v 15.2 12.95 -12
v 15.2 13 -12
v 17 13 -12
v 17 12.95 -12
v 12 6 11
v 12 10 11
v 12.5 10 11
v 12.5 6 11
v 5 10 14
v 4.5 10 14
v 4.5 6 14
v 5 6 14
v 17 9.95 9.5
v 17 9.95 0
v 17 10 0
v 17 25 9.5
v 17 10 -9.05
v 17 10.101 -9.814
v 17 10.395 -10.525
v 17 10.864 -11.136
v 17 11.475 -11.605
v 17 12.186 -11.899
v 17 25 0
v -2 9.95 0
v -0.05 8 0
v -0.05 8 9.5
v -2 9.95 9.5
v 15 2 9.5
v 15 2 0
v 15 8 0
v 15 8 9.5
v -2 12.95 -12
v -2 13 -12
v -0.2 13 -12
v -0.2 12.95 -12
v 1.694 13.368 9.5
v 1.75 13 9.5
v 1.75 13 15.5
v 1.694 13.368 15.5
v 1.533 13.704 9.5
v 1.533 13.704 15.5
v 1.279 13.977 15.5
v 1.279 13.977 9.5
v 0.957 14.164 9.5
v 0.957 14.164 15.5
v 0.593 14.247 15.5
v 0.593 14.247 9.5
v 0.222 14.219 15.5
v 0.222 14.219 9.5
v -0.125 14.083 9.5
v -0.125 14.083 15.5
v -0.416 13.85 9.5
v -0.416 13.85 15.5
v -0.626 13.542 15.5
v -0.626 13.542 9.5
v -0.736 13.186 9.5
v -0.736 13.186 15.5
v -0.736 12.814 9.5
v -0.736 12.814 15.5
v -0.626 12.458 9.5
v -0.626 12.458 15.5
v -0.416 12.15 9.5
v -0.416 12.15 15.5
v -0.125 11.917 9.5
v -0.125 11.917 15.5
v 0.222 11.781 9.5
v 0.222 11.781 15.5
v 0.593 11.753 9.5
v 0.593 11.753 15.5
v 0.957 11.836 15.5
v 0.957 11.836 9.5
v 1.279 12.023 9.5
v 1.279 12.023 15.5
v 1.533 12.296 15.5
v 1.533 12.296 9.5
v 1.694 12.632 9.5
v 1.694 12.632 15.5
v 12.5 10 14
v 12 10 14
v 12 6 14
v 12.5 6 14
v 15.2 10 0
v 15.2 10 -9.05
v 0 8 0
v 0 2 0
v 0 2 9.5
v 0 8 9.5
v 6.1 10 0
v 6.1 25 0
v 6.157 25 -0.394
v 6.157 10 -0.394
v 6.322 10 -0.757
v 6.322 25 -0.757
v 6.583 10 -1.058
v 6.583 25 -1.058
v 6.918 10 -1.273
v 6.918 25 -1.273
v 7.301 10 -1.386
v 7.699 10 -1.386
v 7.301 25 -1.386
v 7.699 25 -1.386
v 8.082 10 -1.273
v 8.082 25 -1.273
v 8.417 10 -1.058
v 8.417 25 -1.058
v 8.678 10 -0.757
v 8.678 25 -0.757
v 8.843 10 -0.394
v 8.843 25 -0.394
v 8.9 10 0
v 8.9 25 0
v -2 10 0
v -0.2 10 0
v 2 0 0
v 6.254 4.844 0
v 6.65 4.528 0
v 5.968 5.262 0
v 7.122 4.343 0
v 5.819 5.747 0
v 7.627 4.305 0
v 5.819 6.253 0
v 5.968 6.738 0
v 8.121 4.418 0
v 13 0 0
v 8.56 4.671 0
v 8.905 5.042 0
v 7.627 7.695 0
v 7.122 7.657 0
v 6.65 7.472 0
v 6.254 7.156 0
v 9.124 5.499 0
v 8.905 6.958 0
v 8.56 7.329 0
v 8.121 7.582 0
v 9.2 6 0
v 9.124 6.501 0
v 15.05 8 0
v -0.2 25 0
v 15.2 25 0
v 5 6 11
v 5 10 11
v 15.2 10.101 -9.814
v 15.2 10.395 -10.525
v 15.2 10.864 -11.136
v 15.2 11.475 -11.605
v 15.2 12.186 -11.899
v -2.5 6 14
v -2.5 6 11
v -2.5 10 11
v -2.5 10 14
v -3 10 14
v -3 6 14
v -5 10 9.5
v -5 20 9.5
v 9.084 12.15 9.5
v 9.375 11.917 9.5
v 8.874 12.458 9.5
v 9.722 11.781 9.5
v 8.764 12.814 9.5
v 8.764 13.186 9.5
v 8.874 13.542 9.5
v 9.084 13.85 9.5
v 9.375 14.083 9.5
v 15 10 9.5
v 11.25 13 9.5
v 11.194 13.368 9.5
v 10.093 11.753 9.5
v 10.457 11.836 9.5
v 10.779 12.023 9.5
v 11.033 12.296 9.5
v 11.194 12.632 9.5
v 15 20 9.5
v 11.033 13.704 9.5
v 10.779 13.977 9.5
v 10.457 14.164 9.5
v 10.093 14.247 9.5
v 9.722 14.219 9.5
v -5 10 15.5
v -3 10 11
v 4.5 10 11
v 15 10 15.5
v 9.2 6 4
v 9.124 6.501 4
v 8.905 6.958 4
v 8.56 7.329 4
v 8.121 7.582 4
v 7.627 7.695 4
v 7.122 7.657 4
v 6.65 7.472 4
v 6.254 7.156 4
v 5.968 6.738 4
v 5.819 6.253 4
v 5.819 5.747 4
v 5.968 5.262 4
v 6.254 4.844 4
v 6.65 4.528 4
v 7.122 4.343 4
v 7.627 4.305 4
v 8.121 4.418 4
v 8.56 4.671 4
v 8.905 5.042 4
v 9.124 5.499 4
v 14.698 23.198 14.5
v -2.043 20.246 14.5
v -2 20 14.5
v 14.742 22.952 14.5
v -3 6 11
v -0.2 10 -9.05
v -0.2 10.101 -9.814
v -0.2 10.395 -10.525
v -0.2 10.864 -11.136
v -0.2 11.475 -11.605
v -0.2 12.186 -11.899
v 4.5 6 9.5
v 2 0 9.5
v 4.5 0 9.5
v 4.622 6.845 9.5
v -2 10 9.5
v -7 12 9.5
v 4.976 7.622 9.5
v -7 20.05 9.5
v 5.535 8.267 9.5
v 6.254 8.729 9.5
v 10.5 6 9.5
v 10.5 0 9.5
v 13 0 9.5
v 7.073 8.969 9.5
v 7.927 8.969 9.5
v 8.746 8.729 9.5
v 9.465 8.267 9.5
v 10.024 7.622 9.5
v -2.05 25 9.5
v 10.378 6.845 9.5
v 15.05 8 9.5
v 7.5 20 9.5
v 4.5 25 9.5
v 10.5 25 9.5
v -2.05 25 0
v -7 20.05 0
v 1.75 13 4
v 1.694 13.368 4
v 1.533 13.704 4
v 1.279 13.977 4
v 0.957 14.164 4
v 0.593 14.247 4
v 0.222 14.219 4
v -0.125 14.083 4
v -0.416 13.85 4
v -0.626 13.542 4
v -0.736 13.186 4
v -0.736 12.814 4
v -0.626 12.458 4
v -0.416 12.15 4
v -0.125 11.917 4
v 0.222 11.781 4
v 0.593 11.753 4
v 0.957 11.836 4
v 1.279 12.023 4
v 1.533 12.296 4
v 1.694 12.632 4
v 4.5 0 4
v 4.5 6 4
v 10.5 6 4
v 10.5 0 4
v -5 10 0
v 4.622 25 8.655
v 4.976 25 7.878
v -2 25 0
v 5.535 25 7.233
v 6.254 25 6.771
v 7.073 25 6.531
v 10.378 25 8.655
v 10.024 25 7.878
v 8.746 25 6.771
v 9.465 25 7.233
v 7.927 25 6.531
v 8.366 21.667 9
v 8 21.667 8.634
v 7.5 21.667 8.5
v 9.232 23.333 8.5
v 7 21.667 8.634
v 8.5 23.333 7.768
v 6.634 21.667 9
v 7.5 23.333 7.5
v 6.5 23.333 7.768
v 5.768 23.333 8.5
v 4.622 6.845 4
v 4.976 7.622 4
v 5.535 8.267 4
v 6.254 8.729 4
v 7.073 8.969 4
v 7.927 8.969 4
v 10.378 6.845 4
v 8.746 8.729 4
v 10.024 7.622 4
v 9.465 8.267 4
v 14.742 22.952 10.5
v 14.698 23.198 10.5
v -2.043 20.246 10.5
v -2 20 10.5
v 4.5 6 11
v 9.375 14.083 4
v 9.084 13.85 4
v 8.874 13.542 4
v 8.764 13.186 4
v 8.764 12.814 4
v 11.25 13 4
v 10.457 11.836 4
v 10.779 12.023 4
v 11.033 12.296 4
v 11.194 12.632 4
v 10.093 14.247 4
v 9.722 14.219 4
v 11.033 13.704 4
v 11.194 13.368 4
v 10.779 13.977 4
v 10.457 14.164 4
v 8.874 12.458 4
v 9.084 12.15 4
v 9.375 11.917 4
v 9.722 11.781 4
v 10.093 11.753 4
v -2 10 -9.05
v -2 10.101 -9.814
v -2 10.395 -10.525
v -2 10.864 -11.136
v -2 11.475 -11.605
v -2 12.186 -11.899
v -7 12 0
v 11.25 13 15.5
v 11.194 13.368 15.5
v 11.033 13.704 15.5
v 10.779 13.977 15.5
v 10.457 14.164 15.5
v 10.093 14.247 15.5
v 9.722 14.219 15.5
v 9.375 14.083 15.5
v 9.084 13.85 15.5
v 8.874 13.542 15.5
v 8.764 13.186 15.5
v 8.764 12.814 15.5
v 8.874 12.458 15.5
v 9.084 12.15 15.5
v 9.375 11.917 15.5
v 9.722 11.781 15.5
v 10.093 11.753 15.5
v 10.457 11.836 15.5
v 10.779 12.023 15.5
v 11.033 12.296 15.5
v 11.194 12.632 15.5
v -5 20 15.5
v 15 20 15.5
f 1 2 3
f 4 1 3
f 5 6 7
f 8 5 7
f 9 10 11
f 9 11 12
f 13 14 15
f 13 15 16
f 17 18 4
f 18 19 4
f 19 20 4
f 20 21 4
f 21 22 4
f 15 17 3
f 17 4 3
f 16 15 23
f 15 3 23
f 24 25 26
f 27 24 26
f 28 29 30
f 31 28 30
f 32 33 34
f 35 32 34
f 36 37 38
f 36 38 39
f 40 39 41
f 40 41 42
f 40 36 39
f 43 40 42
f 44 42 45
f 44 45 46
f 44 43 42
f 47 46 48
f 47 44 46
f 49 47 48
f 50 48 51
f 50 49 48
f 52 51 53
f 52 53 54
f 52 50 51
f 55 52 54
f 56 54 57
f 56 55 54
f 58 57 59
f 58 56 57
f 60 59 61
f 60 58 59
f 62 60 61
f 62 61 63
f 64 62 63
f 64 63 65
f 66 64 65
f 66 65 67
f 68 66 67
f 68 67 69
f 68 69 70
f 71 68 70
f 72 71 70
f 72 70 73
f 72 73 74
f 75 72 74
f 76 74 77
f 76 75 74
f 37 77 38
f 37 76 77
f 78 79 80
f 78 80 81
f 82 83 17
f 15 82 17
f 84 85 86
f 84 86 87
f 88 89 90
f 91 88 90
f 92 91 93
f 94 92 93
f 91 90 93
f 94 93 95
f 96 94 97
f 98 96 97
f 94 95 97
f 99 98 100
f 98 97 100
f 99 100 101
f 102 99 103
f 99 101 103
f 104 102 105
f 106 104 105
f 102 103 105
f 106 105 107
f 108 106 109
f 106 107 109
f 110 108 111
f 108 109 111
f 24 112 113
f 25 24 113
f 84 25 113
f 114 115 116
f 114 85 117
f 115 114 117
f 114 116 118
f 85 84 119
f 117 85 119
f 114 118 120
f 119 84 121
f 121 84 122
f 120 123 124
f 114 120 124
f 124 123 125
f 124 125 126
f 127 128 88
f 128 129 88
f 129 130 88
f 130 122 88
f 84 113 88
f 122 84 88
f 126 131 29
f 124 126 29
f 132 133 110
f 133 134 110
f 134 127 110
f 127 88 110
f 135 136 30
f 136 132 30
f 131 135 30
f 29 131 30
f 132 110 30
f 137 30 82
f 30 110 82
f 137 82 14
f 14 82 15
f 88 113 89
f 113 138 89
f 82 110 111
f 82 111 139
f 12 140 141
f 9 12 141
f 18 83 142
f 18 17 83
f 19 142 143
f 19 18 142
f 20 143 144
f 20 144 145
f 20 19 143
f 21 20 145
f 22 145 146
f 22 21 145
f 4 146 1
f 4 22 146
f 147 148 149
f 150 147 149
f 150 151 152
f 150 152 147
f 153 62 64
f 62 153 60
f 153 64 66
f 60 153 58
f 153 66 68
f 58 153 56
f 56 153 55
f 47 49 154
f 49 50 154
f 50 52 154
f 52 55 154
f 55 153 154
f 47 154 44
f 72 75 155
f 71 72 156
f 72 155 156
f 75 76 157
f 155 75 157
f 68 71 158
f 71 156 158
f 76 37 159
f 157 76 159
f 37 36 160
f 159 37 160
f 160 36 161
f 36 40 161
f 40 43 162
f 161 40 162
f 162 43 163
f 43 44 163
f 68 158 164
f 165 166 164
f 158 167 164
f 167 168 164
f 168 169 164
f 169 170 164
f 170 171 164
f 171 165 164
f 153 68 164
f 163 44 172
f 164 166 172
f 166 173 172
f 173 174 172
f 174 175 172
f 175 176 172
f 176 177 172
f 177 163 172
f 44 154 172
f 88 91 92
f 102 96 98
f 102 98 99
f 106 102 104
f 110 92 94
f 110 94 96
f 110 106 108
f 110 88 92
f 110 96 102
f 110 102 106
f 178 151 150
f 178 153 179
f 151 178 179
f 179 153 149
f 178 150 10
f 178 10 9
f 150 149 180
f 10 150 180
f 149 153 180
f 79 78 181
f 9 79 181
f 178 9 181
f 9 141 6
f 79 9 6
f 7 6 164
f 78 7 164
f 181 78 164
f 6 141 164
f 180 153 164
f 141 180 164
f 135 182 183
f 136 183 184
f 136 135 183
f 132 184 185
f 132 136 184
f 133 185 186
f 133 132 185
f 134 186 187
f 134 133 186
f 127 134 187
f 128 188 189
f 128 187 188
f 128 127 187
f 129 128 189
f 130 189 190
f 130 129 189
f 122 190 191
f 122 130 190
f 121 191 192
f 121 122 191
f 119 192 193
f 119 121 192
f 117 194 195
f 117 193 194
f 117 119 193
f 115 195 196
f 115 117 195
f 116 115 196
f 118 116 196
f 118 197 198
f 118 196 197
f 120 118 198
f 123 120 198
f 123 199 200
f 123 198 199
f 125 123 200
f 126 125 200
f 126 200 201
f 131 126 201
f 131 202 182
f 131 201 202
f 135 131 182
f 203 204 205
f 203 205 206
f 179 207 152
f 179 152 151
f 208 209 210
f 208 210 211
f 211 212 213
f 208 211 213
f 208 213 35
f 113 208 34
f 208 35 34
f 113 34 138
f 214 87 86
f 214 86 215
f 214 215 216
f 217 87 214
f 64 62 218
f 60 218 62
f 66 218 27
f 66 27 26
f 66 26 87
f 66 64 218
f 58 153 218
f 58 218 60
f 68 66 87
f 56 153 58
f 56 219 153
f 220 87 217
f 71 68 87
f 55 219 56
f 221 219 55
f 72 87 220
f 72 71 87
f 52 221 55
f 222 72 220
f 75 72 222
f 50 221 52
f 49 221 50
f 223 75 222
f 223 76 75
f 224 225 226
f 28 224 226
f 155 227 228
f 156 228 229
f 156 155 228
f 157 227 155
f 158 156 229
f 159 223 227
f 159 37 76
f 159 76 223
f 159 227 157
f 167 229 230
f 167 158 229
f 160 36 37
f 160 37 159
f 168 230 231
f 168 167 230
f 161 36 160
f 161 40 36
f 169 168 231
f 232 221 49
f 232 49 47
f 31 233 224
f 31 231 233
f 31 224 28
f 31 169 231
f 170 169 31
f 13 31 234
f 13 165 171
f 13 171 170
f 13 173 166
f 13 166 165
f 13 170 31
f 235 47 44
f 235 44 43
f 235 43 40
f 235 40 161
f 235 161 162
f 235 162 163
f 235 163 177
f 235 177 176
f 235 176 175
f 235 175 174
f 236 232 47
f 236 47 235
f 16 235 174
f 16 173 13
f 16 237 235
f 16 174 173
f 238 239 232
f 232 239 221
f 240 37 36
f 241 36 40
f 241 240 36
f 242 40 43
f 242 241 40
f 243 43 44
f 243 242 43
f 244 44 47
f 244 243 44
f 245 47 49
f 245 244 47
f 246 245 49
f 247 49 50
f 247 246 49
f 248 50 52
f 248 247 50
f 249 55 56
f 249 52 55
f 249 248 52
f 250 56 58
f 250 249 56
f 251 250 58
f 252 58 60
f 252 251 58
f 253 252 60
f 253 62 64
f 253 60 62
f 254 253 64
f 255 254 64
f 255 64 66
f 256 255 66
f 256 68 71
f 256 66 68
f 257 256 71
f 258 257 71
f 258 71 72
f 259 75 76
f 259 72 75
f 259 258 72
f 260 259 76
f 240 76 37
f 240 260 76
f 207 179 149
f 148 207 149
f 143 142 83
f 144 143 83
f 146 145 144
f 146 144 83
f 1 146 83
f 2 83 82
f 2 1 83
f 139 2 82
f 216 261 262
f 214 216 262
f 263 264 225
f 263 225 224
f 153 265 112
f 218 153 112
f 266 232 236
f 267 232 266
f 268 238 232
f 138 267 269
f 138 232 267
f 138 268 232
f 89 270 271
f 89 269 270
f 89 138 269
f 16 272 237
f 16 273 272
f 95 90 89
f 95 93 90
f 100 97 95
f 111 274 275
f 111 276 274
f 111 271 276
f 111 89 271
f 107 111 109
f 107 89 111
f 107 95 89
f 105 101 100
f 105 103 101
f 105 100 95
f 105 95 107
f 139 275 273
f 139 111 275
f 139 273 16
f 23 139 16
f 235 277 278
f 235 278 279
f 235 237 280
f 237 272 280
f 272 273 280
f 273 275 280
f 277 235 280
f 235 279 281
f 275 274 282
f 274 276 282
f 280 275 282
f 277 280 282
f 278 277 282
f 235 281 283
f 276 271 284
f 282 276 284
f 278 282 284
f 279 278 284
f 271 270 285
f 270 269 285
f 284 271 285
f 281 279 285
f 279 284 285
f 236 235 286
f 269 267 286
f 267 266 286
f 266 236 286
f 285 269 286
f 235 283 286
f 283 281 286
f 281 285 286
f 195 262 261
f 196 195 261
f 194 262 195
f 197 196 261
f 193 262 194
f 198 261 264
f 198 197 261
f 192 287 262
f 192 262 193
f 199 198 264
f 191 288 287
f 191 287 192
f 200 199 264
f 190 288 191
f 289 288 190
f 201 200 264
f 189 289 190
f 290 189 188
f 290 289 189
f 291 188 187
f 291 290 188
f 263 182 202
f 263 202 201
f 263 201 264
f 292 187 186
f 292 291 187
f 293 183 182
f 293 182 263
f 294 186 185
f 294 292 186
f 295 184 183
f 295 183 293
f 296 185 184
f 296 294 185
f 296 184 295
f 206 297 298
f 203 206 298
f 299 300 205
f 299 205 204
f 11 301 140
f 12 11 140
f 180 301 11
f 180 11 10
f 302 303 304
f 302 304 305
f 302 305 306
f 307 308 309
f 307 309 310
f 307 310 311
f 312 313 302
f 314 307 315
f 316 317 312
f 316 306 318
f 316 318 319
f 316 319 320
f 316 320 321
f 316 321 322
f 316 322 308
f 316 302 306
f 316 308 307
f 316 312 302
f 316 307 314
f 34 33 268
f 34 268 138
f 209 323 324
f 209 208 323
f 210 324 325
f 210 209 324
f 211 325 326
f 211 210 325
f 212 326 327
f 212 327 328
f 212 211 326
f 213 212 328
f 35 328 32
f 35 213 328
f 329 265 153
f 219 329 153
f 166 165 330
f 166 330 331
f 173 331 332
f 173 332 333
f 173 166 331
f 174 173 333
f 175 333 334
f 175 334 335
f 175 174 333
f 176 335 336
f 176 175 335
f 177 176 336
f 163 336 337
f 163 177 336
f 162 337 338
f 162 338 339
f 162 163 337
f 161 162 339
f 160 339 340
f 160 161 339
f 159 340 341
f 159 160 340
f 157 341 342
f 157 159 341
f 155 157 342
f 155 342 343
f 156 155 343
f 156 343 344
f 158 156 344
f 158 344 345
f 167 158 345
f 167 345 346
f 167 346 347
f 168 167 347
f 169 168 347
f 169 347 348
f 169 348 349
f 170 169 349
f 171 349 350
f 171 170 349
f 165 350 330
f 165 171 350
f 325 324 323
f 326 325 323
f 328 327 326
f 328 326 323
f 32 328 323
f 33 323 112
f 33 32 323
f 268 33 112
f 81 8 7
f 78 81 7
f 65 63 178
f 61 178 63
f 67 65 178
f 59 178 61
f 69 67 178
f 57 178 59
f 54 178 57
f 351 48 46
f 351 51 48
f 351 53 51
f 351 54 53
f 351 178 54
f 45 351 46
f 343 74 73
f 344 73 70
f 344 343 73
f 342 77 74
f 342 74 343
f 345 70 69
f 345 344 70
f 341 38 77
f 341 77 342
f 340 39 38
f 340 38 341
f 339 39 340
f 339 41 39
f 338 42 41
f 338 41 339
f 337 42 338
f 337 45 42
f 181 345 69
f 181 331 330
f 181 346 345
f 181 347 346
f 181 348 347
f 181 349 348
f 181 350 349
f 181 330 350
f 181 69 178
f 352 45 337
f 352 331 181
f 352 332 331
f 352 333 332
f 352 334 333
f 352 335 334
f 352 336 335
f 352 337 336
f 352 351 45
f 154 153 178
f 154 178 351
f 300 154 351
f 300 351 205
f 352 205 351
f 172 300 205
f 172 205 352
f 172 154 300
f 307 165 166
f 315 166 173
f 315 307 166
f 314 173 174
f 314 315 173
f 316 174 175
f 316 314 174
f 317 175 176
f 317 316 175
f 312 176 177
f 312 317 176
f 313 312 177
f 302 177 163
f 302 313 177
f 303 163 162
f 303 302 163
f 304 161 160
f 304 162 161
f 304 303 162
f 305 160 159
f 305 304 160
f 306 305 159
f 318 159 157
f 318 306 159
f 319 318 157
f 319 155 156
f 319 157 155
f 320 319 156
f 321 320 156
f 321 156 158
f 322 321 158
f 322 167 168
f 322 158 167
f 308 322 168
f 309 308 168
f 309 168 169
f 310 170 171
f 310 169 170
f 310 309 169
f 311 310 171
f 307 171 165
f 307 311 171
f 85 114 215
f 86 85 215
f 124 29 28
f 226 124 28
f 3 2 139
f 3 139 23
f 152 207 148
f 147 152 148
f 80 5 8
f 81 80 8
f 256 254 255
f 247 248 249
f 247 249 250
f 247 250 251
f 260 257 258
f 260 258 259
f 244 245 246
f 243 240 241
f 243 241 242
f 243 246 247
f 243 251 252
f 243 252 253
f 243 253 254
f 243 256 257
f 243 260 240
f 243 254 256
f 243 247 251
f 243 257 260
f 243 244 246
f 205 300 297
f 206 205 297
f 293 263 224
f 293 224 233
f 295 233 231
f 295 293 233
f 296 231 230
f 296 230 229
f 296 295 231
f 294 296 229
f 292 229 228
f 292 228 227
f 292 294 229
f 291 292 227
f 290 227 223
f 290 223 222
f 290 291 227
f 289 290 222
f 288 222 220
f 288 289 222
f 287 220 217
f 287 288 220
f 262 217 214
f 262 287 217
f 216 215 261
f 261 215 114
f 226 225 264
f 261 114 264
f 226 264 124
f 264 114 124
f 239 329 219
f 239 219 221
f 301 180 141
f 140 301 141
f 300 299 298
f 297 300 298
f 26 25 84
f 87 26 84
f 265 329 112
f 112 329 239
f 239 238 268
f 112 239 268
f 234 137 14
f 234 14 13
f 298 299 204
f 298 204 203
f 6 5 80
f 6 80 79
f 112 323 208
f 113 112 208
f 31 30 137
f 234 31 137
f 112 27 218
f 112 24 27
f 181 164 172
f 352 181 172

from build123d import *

# Parameters (mm, degrees)
CYLINDER001_R          = 1.25
CYLINDER001_DEPTH      = 6
CYLINDER_R             = 1.25
CYLINDER_DEPTH         = 6
BOX003_W               = 0.5
BOX003_H               = 4
BOX003_DEPTH           = 3
BOX004_W               = 0.5
BOX004_H               = 4
BOX004_DEPTH           = 3
BOX005_W               = 0.5
BOX005_H               = 4
BOX005_DEPTH           = 3
BOX006_W               = 17
BOX006_H               = 0.25
BOX006_DEPTH           = 4
BOX006_PLACEMENT_ANGLE = 10
BOX002_W               = 20
BOX002_H               = 10
BOX002_DEPTH           = 6
CONE_ROLL_ANGLE        = -90
CYLINDER003_R          = 1.7
CYLINDER003_DEPTH      = 9.5
CYLINDER002_R          = 3
CYLINDER002_DEPTH      = 5.5
BOX008_W               = 6
BOX008_H               = 6
BOX008_DEPTH           = 5.5
CYLINDER005_R          = 1.25
CYLINDER005_DEPTH      = 6
CYLINDER006_R          = 1.25
CYLINDER006_DEPTH      = 6
BOX014_W               = 2
BOX014_H               = 2
BOX014_DEPTH           = 9.5
BOX_W                  = 2
BOX_H                  = 2
BOX_DEPTH              = 9.5
BOX011_W               = 1.8
BOX011_H               = 15
BOX011_DEPTH           = 21.5
BOX010_W               = 1.8
BOX010_H               = 15
BOX010_DEPTH           = 21.5
CYLINDER004_R          = 1.4
CYLINDER004_DEPTH      = 15
CYLINDER004_ROLL_ANGLE = 90
BOX013_W               = 0.2
BOX013_H               = 15
BOX013_DEPTH           = 9.5
BOX012_W               = 0.2
BOX012_H               = 15
BOX012_DEPTH           = 9.5
BOX009_W               = 5
BOX009_H               = 15
BOX009_DEPTH           = 9.5
BOX007_W               = 15
BOX007_H               = 25
BOX007_DEPTH           = 9.5
CHAMFER_1_SIZE         = 12
CHAMFER_2_SIZE         = 4.95
CHAMFER_3_SIZE         = 2
CHAMFER_4_SIZE         = 1.95
FILLET_R               = 2.95


with BuildPart() as cylinder001:
    # Cylinder001 → Cylinder001 (new body)
    with BuildSketch(Plane(origin=(5.5, 3, 0), x_dir=(1, 0, 0), z_dir=(0, 0, 1))):
        Circle(CYLINDER001_R)
    extrude(amount=CYLINDER001_DEPTH)


with BuildPart() as cylinder:
    # Cylinder → Cylinder (new body)
    with BuildSketch(Plane(origin=(15, 3, 0), x_dir=(1, 0, 0), z_dir=(0, 0, 1))):
        Circle(CYLINDER_R)
    extrude(amount=CYLINDER_DEPTH)


with BuildPart() as cube003:
    # Box003 → Box003 (new body)
    with BuildSketch(Plane(origin=(17, -4, 1.5), x_dir=(1, 0, 0), z_dir=(0, 0, 1))):
        with Locations((0.25, 2)):
            Rectangle(BOX003_W, BOX003_H)
    extrude(amount=BOX003_DEPTH)


with BuildPart() as cube004:
    # Box004 → Box004 (new body)
    with BuildSketch(Plane(origin=(9.5, -4, 1.5), x_dir=(1, 0, 0), z_dir=(0, 0, 1))):
        with Locations((0.25, 2)):
            Rectangle(BOX004_W, BOX004_H)
    extrude(amount=BOX004_DEPTH)


with BuildPart() as cube005:
    # Box005 → Box005 (new body)
    with BuildSketch(Plane(origin=(2, -4, 1.5), x_dir=(1, 0, 0), z_dir=(0, 0, 1))):
        with Locations((0.25, 2)):
            Rectangle(BOX005_W, BOX005_H)
    extrude(amount=BOX005_DEPTH)


with BuildPart() as cube006:
    # Box006 → Box006 (new body)
    with BuildSketch(Plane.XY):
        with Locations((8.5, 0.125)):
            Rectangle(BOX006_W, BOX006_H)
    extrude(amount=BOX006_DEPTH)


with BuildPart() as cube006_1:
    # Box006 placement: moved
    add(cube006.part.moved(Location((3, 10, 1))).rotate(Axis((3, 10, 1), (0, 0, 1)), BOX006_PLACEMENT_ANGLE))


with BuildPart() as do_not_print_microswitch:
    # Box002 → Box002 (new body)
    with BuildSketch(Plane.XY):
        with Locations((10, 5)):
            Rectangle(BOX002_W, BOX002_H)
    extrude(amount=BOX002_DEPTH)

    # Fusion: union Cube003, Cube004, Cube005, Cube006
    add(cube003.part)
    add(cube004.part)
    add(cube005.part)
    add(cube006_1.part)

    # Cut: cut Cylinder
    add(cylinder.part, mode=Mode.SUBTRACT)

    # Cut001: cut Cylinder001
    add(cylinder001.part, mode=Mode.SUBTRACT)


with BuildPart() as do_not_print_microswitch_1:
    # Cut001 placement: moved
    add(do_not_print_microswitch.part.moved(Location((-5, 10, 9.5))))


with BuildPart() as deltaadjustmentscrew:
    # Cone → Cone (revolve)
    with BuildSketch(Plane.XZ):
        Polygon((0, 0), (3, 5), (0, 5), align=None)
    revolve(axis=Axis((0, 0, 0), (0, 0, 1)))


with BuildPart() as deltaadjustmentscrew_1:
    # Cone roll: moved
    add(deltaadjustmentscrew.part.rotate(Axis((0, 0, 0), (1, 0, 0)), CONE_ROLL_ANGLE))


with BuildPart() as deltaadjustmentscrew_2:
    # Cone placement: moved
    add(deltaadjustmentscrew_1.part.moved(Location((7.5, 20, 9.5))))


with BuildPart() as deltam3:
    # Cylinder003 → Cylinder003 (new body)
    with BuildSketch(Plane(origin=(7.5, 6, 0), x_dir=(1, 0, 0), z_dir=(0, 0, 1))):
        Circle(CYLINDER003_R)
    extrude(amount=CYLINDER003_DEPTH)


with BuildPart() as deltacylinder:
    # Cylinder002 → Cylinder002 (new body)
    with BuildSketch(Plane(origin=(7.5, 6, 4), x_dir=(1, 0, 0), z_dir=(0, 0, 1))):
        Circle(CYLINDER002_R)
    extrude(amount=CYLINDER002_DEPTH)


with BuildPart() as deltanutpocket:
    # Box008 → Box008 (new body)
    with BuildSketch(Plane(origin=(4.5, 0, 4), x_dir=(1, 0, 0), z_dir=(0, 0, 1))):
        with Locations((3, 3)):
            Rectangle(BOX008_W, BOX008_H)
    extrude(amount=BOX008_DEPTH)

    # Fusion001: union DeltaCylinder
    add(deltacylinder.part)


with BuildPart() as cylinder005:
    # Cylinder005 → Cylinder005 (new body)
    with BuildSketch(Plane(origin=(10, 13, 4), x_dir=(1, 0, 0), z_dir=(0, 0, 1))):
        Circle(CYLINDER005_R)
    extrude(amount=CYLINDER005_DEPTH)


with BuildPart() as deltafusion:
    # Cylinder006 → Cylinder006 (new body)
    with BuildSketch(Plane(origin=(0.5, 13, 4), x_dir=(1, 0, 0), z_dir=(0, 0, 1))):
        Circle(CYLINDER006_R)
    extrude(amount=CYLINDER006_DEPTH)

    # Fusion003: union DeltaAdjustmentScrew, DeltaM3, DeltaNutPocket, Cylinder005
    add(deltaadjustmentscrew_2.part)
    add(deltam3.part)
    add(deltanutpocket.part)
    add(cylinder005.part)


with BuildPart() as cube007:
    # Box014 → Box014 (new body)
    with BuildSketch(Plane(origin=(15, 8, 0), x_dir=(1, 0, 0), z_dir=(0, 0, 1))):
        with Locations((1, 1)):
            Rectangle(BOX014_W, BOX014_H)
    extrude(amount=BOX014_DEPTH)


with BuildPart() as cube:
    # Box → Box (new body)
    with BuildSketch(Plane(origin=(-2, 8, 0), x_dir=(1, 0, 0), z_dir=(0, 0, 1))):
        with Locations((1, 1)):
            Rectangle(BOX_W, BOX_H)
    extrude(amount=BOX_DEPTH)


with BuildPart() as sideright:
    # Box011 → Box011 (new body)
    with BuildSketch(Plane(origin=(-2, 10, -12), x_dir=(1, 0, 0), z_dir=(0, 0, 1))):
        with Locations((0.9, 7.5)):
            Rectangle(BOX011_W, BOX011_H)
    extrude(amount=BOX011_DEPTH)


with BuildPart() as sideleft:
    # Box010 → Box010 (new body)
    with BuildSketch(Plane(origin=(15.2, 10, -12), x_dir=(1, 0, 0), z_dir=(0, 0, 1))):
        with Locations((0.9, 7.5)):
            Rectangle(BOX010_W, BOX010_H)
    extrude(amount=BOX010_DEPTH)


with BuildPart() as snaptoextrusion:
    # Cylinder004 → Cylinder004 (new body)
    with BuildSketch(Plane.XY):
        Circle(CYLINDER004_R)
    extrude(amount=CYLINDER004_DEPTH)


with BuildPart() as snaptoextrusion_1:
    # Cylinder004 roll: moved
    add(snaptoextrusion.part.rotate(Axis((0, 0, 0), (1, 0, 0)), CYLINDER004_ROLL_ANGLE))


with BuildPart() as snaptoextrusion_2:
    # Cylinder004 placement: moved
    add(snaptoextrusion_1.part.moved(Location((7.5, 25, 0))))


with BuildPart() as siderightdistance:
    # Box013 → Box013 (new body)
    with BuildSketch(Plane(origin=(-0.2, 10, 0), x_dir=(1, 0, 0), z_dir=(0, 0, 1))):
        with Locations((0.1, 7.5)):
            Rectangle(BOX013_W, BOX013_H)
    extrude(amount=BOX013_DEPTH)


with BuildPart() as sideleftdistance:
    # Box012 → Box012 (new body)
    with BuildSketch(Plane(origin=(15, 10, 0), x_dir=(1, 0, 0), z_dir=(0, 0, 1))):
        with Locations((0.1, 7.5)):
            Rectangle(BOX012_W, BOX012_H)
    extrude(amount=BOX012_DEPTH)


with BuildPart() as attachright:
    # Box009 → Box009 (new body)
    with BuildSketch(Plane(origin=(-7, 10, 0), x_dir=(1, 0, 0), z_dir=(0, 0, 1))):
        with Locations((2.5, 7.5)):
            Rectangle(BOX009_W, BOX009_H)
    extrude(amount=BOX009_DEPTH)


with BuildPart() as igus_endstop:
    # Box007 → Box007 (new body)
    with BuildSketch(Plane.XY):
        with Locations((7.5, 12.5)):
            Rectangle(BOX007_W, BOX007_H)
    extrude(amount=BOX007_DEPTH)

    # Fusion002: union Cube007, Cube, SideRight, SideLeft, SnapToExtrusion, SideRightDistance, SideLeftDistance, AttachRight
    add(cube007.part)
    add(cube.part)
    add(sideright.part)
    add(sideleft.part)
    add(snaptoextrusion_2.part)
    add(siderightdistance.part)
    add(sideleftdistance.part)
    add(attachright.part)

    # Cut002: cut DeltaFusion
    add(deltafusion.part, mode=Mode.SUBTRACT)

    # Chamfer 1
    chamfer_1_edges = [igus_endstop.edges().sort_by_distance(p)[0] for p in [
        (-1.1, 25, -12),
        (16.1, 25, -12),
    ]]
    chamfer(chamfer_1_edges, length=CHAMFER_1_SIZE)

    # Chamfer 2
    chamfer_2_edges = [igus_endstop.edges().sort_by_distance(p)[0] for p in [
        (-7, 25, 4.75),
    ]]
    chamfer(chamfer_2_edges, length=CHAMFER_2_SIZE)

    # Chamfer 3
    chamfer_3_edges = [igus_endstop.edges().sort_by_distance(p)[0] for p in [
        (-7, 10, 4.75),
        (0, 0, 4.75),
        (15, 0, 4.75),
    ]]
    chamfer(chamfer_3_edges, length=CHAMFER_3_SIZE)

    # Chamfer 4
    chamfer_4_edges = [igus_endstop.edges().sort_by_distance(p)[0] for p in [
        (-2, 8, 4.75),
        (17, 8, 4.75),
    ]]
    chamfer(chamfer_4_edges, length=CHAMFER_4_SIZE)

    # Fillet
    fillet_edges = [igus_endstop.edges().sort_by_distance(p)[0] for p in [
        (-1.1, 10, -12),
        (16.1, 10, -12),
    ]]
    fillet(fillet_edges, radius=FILLET_R)


solid = Compound([do_not_print_microswitch_1.part, igus_endstop.part])
